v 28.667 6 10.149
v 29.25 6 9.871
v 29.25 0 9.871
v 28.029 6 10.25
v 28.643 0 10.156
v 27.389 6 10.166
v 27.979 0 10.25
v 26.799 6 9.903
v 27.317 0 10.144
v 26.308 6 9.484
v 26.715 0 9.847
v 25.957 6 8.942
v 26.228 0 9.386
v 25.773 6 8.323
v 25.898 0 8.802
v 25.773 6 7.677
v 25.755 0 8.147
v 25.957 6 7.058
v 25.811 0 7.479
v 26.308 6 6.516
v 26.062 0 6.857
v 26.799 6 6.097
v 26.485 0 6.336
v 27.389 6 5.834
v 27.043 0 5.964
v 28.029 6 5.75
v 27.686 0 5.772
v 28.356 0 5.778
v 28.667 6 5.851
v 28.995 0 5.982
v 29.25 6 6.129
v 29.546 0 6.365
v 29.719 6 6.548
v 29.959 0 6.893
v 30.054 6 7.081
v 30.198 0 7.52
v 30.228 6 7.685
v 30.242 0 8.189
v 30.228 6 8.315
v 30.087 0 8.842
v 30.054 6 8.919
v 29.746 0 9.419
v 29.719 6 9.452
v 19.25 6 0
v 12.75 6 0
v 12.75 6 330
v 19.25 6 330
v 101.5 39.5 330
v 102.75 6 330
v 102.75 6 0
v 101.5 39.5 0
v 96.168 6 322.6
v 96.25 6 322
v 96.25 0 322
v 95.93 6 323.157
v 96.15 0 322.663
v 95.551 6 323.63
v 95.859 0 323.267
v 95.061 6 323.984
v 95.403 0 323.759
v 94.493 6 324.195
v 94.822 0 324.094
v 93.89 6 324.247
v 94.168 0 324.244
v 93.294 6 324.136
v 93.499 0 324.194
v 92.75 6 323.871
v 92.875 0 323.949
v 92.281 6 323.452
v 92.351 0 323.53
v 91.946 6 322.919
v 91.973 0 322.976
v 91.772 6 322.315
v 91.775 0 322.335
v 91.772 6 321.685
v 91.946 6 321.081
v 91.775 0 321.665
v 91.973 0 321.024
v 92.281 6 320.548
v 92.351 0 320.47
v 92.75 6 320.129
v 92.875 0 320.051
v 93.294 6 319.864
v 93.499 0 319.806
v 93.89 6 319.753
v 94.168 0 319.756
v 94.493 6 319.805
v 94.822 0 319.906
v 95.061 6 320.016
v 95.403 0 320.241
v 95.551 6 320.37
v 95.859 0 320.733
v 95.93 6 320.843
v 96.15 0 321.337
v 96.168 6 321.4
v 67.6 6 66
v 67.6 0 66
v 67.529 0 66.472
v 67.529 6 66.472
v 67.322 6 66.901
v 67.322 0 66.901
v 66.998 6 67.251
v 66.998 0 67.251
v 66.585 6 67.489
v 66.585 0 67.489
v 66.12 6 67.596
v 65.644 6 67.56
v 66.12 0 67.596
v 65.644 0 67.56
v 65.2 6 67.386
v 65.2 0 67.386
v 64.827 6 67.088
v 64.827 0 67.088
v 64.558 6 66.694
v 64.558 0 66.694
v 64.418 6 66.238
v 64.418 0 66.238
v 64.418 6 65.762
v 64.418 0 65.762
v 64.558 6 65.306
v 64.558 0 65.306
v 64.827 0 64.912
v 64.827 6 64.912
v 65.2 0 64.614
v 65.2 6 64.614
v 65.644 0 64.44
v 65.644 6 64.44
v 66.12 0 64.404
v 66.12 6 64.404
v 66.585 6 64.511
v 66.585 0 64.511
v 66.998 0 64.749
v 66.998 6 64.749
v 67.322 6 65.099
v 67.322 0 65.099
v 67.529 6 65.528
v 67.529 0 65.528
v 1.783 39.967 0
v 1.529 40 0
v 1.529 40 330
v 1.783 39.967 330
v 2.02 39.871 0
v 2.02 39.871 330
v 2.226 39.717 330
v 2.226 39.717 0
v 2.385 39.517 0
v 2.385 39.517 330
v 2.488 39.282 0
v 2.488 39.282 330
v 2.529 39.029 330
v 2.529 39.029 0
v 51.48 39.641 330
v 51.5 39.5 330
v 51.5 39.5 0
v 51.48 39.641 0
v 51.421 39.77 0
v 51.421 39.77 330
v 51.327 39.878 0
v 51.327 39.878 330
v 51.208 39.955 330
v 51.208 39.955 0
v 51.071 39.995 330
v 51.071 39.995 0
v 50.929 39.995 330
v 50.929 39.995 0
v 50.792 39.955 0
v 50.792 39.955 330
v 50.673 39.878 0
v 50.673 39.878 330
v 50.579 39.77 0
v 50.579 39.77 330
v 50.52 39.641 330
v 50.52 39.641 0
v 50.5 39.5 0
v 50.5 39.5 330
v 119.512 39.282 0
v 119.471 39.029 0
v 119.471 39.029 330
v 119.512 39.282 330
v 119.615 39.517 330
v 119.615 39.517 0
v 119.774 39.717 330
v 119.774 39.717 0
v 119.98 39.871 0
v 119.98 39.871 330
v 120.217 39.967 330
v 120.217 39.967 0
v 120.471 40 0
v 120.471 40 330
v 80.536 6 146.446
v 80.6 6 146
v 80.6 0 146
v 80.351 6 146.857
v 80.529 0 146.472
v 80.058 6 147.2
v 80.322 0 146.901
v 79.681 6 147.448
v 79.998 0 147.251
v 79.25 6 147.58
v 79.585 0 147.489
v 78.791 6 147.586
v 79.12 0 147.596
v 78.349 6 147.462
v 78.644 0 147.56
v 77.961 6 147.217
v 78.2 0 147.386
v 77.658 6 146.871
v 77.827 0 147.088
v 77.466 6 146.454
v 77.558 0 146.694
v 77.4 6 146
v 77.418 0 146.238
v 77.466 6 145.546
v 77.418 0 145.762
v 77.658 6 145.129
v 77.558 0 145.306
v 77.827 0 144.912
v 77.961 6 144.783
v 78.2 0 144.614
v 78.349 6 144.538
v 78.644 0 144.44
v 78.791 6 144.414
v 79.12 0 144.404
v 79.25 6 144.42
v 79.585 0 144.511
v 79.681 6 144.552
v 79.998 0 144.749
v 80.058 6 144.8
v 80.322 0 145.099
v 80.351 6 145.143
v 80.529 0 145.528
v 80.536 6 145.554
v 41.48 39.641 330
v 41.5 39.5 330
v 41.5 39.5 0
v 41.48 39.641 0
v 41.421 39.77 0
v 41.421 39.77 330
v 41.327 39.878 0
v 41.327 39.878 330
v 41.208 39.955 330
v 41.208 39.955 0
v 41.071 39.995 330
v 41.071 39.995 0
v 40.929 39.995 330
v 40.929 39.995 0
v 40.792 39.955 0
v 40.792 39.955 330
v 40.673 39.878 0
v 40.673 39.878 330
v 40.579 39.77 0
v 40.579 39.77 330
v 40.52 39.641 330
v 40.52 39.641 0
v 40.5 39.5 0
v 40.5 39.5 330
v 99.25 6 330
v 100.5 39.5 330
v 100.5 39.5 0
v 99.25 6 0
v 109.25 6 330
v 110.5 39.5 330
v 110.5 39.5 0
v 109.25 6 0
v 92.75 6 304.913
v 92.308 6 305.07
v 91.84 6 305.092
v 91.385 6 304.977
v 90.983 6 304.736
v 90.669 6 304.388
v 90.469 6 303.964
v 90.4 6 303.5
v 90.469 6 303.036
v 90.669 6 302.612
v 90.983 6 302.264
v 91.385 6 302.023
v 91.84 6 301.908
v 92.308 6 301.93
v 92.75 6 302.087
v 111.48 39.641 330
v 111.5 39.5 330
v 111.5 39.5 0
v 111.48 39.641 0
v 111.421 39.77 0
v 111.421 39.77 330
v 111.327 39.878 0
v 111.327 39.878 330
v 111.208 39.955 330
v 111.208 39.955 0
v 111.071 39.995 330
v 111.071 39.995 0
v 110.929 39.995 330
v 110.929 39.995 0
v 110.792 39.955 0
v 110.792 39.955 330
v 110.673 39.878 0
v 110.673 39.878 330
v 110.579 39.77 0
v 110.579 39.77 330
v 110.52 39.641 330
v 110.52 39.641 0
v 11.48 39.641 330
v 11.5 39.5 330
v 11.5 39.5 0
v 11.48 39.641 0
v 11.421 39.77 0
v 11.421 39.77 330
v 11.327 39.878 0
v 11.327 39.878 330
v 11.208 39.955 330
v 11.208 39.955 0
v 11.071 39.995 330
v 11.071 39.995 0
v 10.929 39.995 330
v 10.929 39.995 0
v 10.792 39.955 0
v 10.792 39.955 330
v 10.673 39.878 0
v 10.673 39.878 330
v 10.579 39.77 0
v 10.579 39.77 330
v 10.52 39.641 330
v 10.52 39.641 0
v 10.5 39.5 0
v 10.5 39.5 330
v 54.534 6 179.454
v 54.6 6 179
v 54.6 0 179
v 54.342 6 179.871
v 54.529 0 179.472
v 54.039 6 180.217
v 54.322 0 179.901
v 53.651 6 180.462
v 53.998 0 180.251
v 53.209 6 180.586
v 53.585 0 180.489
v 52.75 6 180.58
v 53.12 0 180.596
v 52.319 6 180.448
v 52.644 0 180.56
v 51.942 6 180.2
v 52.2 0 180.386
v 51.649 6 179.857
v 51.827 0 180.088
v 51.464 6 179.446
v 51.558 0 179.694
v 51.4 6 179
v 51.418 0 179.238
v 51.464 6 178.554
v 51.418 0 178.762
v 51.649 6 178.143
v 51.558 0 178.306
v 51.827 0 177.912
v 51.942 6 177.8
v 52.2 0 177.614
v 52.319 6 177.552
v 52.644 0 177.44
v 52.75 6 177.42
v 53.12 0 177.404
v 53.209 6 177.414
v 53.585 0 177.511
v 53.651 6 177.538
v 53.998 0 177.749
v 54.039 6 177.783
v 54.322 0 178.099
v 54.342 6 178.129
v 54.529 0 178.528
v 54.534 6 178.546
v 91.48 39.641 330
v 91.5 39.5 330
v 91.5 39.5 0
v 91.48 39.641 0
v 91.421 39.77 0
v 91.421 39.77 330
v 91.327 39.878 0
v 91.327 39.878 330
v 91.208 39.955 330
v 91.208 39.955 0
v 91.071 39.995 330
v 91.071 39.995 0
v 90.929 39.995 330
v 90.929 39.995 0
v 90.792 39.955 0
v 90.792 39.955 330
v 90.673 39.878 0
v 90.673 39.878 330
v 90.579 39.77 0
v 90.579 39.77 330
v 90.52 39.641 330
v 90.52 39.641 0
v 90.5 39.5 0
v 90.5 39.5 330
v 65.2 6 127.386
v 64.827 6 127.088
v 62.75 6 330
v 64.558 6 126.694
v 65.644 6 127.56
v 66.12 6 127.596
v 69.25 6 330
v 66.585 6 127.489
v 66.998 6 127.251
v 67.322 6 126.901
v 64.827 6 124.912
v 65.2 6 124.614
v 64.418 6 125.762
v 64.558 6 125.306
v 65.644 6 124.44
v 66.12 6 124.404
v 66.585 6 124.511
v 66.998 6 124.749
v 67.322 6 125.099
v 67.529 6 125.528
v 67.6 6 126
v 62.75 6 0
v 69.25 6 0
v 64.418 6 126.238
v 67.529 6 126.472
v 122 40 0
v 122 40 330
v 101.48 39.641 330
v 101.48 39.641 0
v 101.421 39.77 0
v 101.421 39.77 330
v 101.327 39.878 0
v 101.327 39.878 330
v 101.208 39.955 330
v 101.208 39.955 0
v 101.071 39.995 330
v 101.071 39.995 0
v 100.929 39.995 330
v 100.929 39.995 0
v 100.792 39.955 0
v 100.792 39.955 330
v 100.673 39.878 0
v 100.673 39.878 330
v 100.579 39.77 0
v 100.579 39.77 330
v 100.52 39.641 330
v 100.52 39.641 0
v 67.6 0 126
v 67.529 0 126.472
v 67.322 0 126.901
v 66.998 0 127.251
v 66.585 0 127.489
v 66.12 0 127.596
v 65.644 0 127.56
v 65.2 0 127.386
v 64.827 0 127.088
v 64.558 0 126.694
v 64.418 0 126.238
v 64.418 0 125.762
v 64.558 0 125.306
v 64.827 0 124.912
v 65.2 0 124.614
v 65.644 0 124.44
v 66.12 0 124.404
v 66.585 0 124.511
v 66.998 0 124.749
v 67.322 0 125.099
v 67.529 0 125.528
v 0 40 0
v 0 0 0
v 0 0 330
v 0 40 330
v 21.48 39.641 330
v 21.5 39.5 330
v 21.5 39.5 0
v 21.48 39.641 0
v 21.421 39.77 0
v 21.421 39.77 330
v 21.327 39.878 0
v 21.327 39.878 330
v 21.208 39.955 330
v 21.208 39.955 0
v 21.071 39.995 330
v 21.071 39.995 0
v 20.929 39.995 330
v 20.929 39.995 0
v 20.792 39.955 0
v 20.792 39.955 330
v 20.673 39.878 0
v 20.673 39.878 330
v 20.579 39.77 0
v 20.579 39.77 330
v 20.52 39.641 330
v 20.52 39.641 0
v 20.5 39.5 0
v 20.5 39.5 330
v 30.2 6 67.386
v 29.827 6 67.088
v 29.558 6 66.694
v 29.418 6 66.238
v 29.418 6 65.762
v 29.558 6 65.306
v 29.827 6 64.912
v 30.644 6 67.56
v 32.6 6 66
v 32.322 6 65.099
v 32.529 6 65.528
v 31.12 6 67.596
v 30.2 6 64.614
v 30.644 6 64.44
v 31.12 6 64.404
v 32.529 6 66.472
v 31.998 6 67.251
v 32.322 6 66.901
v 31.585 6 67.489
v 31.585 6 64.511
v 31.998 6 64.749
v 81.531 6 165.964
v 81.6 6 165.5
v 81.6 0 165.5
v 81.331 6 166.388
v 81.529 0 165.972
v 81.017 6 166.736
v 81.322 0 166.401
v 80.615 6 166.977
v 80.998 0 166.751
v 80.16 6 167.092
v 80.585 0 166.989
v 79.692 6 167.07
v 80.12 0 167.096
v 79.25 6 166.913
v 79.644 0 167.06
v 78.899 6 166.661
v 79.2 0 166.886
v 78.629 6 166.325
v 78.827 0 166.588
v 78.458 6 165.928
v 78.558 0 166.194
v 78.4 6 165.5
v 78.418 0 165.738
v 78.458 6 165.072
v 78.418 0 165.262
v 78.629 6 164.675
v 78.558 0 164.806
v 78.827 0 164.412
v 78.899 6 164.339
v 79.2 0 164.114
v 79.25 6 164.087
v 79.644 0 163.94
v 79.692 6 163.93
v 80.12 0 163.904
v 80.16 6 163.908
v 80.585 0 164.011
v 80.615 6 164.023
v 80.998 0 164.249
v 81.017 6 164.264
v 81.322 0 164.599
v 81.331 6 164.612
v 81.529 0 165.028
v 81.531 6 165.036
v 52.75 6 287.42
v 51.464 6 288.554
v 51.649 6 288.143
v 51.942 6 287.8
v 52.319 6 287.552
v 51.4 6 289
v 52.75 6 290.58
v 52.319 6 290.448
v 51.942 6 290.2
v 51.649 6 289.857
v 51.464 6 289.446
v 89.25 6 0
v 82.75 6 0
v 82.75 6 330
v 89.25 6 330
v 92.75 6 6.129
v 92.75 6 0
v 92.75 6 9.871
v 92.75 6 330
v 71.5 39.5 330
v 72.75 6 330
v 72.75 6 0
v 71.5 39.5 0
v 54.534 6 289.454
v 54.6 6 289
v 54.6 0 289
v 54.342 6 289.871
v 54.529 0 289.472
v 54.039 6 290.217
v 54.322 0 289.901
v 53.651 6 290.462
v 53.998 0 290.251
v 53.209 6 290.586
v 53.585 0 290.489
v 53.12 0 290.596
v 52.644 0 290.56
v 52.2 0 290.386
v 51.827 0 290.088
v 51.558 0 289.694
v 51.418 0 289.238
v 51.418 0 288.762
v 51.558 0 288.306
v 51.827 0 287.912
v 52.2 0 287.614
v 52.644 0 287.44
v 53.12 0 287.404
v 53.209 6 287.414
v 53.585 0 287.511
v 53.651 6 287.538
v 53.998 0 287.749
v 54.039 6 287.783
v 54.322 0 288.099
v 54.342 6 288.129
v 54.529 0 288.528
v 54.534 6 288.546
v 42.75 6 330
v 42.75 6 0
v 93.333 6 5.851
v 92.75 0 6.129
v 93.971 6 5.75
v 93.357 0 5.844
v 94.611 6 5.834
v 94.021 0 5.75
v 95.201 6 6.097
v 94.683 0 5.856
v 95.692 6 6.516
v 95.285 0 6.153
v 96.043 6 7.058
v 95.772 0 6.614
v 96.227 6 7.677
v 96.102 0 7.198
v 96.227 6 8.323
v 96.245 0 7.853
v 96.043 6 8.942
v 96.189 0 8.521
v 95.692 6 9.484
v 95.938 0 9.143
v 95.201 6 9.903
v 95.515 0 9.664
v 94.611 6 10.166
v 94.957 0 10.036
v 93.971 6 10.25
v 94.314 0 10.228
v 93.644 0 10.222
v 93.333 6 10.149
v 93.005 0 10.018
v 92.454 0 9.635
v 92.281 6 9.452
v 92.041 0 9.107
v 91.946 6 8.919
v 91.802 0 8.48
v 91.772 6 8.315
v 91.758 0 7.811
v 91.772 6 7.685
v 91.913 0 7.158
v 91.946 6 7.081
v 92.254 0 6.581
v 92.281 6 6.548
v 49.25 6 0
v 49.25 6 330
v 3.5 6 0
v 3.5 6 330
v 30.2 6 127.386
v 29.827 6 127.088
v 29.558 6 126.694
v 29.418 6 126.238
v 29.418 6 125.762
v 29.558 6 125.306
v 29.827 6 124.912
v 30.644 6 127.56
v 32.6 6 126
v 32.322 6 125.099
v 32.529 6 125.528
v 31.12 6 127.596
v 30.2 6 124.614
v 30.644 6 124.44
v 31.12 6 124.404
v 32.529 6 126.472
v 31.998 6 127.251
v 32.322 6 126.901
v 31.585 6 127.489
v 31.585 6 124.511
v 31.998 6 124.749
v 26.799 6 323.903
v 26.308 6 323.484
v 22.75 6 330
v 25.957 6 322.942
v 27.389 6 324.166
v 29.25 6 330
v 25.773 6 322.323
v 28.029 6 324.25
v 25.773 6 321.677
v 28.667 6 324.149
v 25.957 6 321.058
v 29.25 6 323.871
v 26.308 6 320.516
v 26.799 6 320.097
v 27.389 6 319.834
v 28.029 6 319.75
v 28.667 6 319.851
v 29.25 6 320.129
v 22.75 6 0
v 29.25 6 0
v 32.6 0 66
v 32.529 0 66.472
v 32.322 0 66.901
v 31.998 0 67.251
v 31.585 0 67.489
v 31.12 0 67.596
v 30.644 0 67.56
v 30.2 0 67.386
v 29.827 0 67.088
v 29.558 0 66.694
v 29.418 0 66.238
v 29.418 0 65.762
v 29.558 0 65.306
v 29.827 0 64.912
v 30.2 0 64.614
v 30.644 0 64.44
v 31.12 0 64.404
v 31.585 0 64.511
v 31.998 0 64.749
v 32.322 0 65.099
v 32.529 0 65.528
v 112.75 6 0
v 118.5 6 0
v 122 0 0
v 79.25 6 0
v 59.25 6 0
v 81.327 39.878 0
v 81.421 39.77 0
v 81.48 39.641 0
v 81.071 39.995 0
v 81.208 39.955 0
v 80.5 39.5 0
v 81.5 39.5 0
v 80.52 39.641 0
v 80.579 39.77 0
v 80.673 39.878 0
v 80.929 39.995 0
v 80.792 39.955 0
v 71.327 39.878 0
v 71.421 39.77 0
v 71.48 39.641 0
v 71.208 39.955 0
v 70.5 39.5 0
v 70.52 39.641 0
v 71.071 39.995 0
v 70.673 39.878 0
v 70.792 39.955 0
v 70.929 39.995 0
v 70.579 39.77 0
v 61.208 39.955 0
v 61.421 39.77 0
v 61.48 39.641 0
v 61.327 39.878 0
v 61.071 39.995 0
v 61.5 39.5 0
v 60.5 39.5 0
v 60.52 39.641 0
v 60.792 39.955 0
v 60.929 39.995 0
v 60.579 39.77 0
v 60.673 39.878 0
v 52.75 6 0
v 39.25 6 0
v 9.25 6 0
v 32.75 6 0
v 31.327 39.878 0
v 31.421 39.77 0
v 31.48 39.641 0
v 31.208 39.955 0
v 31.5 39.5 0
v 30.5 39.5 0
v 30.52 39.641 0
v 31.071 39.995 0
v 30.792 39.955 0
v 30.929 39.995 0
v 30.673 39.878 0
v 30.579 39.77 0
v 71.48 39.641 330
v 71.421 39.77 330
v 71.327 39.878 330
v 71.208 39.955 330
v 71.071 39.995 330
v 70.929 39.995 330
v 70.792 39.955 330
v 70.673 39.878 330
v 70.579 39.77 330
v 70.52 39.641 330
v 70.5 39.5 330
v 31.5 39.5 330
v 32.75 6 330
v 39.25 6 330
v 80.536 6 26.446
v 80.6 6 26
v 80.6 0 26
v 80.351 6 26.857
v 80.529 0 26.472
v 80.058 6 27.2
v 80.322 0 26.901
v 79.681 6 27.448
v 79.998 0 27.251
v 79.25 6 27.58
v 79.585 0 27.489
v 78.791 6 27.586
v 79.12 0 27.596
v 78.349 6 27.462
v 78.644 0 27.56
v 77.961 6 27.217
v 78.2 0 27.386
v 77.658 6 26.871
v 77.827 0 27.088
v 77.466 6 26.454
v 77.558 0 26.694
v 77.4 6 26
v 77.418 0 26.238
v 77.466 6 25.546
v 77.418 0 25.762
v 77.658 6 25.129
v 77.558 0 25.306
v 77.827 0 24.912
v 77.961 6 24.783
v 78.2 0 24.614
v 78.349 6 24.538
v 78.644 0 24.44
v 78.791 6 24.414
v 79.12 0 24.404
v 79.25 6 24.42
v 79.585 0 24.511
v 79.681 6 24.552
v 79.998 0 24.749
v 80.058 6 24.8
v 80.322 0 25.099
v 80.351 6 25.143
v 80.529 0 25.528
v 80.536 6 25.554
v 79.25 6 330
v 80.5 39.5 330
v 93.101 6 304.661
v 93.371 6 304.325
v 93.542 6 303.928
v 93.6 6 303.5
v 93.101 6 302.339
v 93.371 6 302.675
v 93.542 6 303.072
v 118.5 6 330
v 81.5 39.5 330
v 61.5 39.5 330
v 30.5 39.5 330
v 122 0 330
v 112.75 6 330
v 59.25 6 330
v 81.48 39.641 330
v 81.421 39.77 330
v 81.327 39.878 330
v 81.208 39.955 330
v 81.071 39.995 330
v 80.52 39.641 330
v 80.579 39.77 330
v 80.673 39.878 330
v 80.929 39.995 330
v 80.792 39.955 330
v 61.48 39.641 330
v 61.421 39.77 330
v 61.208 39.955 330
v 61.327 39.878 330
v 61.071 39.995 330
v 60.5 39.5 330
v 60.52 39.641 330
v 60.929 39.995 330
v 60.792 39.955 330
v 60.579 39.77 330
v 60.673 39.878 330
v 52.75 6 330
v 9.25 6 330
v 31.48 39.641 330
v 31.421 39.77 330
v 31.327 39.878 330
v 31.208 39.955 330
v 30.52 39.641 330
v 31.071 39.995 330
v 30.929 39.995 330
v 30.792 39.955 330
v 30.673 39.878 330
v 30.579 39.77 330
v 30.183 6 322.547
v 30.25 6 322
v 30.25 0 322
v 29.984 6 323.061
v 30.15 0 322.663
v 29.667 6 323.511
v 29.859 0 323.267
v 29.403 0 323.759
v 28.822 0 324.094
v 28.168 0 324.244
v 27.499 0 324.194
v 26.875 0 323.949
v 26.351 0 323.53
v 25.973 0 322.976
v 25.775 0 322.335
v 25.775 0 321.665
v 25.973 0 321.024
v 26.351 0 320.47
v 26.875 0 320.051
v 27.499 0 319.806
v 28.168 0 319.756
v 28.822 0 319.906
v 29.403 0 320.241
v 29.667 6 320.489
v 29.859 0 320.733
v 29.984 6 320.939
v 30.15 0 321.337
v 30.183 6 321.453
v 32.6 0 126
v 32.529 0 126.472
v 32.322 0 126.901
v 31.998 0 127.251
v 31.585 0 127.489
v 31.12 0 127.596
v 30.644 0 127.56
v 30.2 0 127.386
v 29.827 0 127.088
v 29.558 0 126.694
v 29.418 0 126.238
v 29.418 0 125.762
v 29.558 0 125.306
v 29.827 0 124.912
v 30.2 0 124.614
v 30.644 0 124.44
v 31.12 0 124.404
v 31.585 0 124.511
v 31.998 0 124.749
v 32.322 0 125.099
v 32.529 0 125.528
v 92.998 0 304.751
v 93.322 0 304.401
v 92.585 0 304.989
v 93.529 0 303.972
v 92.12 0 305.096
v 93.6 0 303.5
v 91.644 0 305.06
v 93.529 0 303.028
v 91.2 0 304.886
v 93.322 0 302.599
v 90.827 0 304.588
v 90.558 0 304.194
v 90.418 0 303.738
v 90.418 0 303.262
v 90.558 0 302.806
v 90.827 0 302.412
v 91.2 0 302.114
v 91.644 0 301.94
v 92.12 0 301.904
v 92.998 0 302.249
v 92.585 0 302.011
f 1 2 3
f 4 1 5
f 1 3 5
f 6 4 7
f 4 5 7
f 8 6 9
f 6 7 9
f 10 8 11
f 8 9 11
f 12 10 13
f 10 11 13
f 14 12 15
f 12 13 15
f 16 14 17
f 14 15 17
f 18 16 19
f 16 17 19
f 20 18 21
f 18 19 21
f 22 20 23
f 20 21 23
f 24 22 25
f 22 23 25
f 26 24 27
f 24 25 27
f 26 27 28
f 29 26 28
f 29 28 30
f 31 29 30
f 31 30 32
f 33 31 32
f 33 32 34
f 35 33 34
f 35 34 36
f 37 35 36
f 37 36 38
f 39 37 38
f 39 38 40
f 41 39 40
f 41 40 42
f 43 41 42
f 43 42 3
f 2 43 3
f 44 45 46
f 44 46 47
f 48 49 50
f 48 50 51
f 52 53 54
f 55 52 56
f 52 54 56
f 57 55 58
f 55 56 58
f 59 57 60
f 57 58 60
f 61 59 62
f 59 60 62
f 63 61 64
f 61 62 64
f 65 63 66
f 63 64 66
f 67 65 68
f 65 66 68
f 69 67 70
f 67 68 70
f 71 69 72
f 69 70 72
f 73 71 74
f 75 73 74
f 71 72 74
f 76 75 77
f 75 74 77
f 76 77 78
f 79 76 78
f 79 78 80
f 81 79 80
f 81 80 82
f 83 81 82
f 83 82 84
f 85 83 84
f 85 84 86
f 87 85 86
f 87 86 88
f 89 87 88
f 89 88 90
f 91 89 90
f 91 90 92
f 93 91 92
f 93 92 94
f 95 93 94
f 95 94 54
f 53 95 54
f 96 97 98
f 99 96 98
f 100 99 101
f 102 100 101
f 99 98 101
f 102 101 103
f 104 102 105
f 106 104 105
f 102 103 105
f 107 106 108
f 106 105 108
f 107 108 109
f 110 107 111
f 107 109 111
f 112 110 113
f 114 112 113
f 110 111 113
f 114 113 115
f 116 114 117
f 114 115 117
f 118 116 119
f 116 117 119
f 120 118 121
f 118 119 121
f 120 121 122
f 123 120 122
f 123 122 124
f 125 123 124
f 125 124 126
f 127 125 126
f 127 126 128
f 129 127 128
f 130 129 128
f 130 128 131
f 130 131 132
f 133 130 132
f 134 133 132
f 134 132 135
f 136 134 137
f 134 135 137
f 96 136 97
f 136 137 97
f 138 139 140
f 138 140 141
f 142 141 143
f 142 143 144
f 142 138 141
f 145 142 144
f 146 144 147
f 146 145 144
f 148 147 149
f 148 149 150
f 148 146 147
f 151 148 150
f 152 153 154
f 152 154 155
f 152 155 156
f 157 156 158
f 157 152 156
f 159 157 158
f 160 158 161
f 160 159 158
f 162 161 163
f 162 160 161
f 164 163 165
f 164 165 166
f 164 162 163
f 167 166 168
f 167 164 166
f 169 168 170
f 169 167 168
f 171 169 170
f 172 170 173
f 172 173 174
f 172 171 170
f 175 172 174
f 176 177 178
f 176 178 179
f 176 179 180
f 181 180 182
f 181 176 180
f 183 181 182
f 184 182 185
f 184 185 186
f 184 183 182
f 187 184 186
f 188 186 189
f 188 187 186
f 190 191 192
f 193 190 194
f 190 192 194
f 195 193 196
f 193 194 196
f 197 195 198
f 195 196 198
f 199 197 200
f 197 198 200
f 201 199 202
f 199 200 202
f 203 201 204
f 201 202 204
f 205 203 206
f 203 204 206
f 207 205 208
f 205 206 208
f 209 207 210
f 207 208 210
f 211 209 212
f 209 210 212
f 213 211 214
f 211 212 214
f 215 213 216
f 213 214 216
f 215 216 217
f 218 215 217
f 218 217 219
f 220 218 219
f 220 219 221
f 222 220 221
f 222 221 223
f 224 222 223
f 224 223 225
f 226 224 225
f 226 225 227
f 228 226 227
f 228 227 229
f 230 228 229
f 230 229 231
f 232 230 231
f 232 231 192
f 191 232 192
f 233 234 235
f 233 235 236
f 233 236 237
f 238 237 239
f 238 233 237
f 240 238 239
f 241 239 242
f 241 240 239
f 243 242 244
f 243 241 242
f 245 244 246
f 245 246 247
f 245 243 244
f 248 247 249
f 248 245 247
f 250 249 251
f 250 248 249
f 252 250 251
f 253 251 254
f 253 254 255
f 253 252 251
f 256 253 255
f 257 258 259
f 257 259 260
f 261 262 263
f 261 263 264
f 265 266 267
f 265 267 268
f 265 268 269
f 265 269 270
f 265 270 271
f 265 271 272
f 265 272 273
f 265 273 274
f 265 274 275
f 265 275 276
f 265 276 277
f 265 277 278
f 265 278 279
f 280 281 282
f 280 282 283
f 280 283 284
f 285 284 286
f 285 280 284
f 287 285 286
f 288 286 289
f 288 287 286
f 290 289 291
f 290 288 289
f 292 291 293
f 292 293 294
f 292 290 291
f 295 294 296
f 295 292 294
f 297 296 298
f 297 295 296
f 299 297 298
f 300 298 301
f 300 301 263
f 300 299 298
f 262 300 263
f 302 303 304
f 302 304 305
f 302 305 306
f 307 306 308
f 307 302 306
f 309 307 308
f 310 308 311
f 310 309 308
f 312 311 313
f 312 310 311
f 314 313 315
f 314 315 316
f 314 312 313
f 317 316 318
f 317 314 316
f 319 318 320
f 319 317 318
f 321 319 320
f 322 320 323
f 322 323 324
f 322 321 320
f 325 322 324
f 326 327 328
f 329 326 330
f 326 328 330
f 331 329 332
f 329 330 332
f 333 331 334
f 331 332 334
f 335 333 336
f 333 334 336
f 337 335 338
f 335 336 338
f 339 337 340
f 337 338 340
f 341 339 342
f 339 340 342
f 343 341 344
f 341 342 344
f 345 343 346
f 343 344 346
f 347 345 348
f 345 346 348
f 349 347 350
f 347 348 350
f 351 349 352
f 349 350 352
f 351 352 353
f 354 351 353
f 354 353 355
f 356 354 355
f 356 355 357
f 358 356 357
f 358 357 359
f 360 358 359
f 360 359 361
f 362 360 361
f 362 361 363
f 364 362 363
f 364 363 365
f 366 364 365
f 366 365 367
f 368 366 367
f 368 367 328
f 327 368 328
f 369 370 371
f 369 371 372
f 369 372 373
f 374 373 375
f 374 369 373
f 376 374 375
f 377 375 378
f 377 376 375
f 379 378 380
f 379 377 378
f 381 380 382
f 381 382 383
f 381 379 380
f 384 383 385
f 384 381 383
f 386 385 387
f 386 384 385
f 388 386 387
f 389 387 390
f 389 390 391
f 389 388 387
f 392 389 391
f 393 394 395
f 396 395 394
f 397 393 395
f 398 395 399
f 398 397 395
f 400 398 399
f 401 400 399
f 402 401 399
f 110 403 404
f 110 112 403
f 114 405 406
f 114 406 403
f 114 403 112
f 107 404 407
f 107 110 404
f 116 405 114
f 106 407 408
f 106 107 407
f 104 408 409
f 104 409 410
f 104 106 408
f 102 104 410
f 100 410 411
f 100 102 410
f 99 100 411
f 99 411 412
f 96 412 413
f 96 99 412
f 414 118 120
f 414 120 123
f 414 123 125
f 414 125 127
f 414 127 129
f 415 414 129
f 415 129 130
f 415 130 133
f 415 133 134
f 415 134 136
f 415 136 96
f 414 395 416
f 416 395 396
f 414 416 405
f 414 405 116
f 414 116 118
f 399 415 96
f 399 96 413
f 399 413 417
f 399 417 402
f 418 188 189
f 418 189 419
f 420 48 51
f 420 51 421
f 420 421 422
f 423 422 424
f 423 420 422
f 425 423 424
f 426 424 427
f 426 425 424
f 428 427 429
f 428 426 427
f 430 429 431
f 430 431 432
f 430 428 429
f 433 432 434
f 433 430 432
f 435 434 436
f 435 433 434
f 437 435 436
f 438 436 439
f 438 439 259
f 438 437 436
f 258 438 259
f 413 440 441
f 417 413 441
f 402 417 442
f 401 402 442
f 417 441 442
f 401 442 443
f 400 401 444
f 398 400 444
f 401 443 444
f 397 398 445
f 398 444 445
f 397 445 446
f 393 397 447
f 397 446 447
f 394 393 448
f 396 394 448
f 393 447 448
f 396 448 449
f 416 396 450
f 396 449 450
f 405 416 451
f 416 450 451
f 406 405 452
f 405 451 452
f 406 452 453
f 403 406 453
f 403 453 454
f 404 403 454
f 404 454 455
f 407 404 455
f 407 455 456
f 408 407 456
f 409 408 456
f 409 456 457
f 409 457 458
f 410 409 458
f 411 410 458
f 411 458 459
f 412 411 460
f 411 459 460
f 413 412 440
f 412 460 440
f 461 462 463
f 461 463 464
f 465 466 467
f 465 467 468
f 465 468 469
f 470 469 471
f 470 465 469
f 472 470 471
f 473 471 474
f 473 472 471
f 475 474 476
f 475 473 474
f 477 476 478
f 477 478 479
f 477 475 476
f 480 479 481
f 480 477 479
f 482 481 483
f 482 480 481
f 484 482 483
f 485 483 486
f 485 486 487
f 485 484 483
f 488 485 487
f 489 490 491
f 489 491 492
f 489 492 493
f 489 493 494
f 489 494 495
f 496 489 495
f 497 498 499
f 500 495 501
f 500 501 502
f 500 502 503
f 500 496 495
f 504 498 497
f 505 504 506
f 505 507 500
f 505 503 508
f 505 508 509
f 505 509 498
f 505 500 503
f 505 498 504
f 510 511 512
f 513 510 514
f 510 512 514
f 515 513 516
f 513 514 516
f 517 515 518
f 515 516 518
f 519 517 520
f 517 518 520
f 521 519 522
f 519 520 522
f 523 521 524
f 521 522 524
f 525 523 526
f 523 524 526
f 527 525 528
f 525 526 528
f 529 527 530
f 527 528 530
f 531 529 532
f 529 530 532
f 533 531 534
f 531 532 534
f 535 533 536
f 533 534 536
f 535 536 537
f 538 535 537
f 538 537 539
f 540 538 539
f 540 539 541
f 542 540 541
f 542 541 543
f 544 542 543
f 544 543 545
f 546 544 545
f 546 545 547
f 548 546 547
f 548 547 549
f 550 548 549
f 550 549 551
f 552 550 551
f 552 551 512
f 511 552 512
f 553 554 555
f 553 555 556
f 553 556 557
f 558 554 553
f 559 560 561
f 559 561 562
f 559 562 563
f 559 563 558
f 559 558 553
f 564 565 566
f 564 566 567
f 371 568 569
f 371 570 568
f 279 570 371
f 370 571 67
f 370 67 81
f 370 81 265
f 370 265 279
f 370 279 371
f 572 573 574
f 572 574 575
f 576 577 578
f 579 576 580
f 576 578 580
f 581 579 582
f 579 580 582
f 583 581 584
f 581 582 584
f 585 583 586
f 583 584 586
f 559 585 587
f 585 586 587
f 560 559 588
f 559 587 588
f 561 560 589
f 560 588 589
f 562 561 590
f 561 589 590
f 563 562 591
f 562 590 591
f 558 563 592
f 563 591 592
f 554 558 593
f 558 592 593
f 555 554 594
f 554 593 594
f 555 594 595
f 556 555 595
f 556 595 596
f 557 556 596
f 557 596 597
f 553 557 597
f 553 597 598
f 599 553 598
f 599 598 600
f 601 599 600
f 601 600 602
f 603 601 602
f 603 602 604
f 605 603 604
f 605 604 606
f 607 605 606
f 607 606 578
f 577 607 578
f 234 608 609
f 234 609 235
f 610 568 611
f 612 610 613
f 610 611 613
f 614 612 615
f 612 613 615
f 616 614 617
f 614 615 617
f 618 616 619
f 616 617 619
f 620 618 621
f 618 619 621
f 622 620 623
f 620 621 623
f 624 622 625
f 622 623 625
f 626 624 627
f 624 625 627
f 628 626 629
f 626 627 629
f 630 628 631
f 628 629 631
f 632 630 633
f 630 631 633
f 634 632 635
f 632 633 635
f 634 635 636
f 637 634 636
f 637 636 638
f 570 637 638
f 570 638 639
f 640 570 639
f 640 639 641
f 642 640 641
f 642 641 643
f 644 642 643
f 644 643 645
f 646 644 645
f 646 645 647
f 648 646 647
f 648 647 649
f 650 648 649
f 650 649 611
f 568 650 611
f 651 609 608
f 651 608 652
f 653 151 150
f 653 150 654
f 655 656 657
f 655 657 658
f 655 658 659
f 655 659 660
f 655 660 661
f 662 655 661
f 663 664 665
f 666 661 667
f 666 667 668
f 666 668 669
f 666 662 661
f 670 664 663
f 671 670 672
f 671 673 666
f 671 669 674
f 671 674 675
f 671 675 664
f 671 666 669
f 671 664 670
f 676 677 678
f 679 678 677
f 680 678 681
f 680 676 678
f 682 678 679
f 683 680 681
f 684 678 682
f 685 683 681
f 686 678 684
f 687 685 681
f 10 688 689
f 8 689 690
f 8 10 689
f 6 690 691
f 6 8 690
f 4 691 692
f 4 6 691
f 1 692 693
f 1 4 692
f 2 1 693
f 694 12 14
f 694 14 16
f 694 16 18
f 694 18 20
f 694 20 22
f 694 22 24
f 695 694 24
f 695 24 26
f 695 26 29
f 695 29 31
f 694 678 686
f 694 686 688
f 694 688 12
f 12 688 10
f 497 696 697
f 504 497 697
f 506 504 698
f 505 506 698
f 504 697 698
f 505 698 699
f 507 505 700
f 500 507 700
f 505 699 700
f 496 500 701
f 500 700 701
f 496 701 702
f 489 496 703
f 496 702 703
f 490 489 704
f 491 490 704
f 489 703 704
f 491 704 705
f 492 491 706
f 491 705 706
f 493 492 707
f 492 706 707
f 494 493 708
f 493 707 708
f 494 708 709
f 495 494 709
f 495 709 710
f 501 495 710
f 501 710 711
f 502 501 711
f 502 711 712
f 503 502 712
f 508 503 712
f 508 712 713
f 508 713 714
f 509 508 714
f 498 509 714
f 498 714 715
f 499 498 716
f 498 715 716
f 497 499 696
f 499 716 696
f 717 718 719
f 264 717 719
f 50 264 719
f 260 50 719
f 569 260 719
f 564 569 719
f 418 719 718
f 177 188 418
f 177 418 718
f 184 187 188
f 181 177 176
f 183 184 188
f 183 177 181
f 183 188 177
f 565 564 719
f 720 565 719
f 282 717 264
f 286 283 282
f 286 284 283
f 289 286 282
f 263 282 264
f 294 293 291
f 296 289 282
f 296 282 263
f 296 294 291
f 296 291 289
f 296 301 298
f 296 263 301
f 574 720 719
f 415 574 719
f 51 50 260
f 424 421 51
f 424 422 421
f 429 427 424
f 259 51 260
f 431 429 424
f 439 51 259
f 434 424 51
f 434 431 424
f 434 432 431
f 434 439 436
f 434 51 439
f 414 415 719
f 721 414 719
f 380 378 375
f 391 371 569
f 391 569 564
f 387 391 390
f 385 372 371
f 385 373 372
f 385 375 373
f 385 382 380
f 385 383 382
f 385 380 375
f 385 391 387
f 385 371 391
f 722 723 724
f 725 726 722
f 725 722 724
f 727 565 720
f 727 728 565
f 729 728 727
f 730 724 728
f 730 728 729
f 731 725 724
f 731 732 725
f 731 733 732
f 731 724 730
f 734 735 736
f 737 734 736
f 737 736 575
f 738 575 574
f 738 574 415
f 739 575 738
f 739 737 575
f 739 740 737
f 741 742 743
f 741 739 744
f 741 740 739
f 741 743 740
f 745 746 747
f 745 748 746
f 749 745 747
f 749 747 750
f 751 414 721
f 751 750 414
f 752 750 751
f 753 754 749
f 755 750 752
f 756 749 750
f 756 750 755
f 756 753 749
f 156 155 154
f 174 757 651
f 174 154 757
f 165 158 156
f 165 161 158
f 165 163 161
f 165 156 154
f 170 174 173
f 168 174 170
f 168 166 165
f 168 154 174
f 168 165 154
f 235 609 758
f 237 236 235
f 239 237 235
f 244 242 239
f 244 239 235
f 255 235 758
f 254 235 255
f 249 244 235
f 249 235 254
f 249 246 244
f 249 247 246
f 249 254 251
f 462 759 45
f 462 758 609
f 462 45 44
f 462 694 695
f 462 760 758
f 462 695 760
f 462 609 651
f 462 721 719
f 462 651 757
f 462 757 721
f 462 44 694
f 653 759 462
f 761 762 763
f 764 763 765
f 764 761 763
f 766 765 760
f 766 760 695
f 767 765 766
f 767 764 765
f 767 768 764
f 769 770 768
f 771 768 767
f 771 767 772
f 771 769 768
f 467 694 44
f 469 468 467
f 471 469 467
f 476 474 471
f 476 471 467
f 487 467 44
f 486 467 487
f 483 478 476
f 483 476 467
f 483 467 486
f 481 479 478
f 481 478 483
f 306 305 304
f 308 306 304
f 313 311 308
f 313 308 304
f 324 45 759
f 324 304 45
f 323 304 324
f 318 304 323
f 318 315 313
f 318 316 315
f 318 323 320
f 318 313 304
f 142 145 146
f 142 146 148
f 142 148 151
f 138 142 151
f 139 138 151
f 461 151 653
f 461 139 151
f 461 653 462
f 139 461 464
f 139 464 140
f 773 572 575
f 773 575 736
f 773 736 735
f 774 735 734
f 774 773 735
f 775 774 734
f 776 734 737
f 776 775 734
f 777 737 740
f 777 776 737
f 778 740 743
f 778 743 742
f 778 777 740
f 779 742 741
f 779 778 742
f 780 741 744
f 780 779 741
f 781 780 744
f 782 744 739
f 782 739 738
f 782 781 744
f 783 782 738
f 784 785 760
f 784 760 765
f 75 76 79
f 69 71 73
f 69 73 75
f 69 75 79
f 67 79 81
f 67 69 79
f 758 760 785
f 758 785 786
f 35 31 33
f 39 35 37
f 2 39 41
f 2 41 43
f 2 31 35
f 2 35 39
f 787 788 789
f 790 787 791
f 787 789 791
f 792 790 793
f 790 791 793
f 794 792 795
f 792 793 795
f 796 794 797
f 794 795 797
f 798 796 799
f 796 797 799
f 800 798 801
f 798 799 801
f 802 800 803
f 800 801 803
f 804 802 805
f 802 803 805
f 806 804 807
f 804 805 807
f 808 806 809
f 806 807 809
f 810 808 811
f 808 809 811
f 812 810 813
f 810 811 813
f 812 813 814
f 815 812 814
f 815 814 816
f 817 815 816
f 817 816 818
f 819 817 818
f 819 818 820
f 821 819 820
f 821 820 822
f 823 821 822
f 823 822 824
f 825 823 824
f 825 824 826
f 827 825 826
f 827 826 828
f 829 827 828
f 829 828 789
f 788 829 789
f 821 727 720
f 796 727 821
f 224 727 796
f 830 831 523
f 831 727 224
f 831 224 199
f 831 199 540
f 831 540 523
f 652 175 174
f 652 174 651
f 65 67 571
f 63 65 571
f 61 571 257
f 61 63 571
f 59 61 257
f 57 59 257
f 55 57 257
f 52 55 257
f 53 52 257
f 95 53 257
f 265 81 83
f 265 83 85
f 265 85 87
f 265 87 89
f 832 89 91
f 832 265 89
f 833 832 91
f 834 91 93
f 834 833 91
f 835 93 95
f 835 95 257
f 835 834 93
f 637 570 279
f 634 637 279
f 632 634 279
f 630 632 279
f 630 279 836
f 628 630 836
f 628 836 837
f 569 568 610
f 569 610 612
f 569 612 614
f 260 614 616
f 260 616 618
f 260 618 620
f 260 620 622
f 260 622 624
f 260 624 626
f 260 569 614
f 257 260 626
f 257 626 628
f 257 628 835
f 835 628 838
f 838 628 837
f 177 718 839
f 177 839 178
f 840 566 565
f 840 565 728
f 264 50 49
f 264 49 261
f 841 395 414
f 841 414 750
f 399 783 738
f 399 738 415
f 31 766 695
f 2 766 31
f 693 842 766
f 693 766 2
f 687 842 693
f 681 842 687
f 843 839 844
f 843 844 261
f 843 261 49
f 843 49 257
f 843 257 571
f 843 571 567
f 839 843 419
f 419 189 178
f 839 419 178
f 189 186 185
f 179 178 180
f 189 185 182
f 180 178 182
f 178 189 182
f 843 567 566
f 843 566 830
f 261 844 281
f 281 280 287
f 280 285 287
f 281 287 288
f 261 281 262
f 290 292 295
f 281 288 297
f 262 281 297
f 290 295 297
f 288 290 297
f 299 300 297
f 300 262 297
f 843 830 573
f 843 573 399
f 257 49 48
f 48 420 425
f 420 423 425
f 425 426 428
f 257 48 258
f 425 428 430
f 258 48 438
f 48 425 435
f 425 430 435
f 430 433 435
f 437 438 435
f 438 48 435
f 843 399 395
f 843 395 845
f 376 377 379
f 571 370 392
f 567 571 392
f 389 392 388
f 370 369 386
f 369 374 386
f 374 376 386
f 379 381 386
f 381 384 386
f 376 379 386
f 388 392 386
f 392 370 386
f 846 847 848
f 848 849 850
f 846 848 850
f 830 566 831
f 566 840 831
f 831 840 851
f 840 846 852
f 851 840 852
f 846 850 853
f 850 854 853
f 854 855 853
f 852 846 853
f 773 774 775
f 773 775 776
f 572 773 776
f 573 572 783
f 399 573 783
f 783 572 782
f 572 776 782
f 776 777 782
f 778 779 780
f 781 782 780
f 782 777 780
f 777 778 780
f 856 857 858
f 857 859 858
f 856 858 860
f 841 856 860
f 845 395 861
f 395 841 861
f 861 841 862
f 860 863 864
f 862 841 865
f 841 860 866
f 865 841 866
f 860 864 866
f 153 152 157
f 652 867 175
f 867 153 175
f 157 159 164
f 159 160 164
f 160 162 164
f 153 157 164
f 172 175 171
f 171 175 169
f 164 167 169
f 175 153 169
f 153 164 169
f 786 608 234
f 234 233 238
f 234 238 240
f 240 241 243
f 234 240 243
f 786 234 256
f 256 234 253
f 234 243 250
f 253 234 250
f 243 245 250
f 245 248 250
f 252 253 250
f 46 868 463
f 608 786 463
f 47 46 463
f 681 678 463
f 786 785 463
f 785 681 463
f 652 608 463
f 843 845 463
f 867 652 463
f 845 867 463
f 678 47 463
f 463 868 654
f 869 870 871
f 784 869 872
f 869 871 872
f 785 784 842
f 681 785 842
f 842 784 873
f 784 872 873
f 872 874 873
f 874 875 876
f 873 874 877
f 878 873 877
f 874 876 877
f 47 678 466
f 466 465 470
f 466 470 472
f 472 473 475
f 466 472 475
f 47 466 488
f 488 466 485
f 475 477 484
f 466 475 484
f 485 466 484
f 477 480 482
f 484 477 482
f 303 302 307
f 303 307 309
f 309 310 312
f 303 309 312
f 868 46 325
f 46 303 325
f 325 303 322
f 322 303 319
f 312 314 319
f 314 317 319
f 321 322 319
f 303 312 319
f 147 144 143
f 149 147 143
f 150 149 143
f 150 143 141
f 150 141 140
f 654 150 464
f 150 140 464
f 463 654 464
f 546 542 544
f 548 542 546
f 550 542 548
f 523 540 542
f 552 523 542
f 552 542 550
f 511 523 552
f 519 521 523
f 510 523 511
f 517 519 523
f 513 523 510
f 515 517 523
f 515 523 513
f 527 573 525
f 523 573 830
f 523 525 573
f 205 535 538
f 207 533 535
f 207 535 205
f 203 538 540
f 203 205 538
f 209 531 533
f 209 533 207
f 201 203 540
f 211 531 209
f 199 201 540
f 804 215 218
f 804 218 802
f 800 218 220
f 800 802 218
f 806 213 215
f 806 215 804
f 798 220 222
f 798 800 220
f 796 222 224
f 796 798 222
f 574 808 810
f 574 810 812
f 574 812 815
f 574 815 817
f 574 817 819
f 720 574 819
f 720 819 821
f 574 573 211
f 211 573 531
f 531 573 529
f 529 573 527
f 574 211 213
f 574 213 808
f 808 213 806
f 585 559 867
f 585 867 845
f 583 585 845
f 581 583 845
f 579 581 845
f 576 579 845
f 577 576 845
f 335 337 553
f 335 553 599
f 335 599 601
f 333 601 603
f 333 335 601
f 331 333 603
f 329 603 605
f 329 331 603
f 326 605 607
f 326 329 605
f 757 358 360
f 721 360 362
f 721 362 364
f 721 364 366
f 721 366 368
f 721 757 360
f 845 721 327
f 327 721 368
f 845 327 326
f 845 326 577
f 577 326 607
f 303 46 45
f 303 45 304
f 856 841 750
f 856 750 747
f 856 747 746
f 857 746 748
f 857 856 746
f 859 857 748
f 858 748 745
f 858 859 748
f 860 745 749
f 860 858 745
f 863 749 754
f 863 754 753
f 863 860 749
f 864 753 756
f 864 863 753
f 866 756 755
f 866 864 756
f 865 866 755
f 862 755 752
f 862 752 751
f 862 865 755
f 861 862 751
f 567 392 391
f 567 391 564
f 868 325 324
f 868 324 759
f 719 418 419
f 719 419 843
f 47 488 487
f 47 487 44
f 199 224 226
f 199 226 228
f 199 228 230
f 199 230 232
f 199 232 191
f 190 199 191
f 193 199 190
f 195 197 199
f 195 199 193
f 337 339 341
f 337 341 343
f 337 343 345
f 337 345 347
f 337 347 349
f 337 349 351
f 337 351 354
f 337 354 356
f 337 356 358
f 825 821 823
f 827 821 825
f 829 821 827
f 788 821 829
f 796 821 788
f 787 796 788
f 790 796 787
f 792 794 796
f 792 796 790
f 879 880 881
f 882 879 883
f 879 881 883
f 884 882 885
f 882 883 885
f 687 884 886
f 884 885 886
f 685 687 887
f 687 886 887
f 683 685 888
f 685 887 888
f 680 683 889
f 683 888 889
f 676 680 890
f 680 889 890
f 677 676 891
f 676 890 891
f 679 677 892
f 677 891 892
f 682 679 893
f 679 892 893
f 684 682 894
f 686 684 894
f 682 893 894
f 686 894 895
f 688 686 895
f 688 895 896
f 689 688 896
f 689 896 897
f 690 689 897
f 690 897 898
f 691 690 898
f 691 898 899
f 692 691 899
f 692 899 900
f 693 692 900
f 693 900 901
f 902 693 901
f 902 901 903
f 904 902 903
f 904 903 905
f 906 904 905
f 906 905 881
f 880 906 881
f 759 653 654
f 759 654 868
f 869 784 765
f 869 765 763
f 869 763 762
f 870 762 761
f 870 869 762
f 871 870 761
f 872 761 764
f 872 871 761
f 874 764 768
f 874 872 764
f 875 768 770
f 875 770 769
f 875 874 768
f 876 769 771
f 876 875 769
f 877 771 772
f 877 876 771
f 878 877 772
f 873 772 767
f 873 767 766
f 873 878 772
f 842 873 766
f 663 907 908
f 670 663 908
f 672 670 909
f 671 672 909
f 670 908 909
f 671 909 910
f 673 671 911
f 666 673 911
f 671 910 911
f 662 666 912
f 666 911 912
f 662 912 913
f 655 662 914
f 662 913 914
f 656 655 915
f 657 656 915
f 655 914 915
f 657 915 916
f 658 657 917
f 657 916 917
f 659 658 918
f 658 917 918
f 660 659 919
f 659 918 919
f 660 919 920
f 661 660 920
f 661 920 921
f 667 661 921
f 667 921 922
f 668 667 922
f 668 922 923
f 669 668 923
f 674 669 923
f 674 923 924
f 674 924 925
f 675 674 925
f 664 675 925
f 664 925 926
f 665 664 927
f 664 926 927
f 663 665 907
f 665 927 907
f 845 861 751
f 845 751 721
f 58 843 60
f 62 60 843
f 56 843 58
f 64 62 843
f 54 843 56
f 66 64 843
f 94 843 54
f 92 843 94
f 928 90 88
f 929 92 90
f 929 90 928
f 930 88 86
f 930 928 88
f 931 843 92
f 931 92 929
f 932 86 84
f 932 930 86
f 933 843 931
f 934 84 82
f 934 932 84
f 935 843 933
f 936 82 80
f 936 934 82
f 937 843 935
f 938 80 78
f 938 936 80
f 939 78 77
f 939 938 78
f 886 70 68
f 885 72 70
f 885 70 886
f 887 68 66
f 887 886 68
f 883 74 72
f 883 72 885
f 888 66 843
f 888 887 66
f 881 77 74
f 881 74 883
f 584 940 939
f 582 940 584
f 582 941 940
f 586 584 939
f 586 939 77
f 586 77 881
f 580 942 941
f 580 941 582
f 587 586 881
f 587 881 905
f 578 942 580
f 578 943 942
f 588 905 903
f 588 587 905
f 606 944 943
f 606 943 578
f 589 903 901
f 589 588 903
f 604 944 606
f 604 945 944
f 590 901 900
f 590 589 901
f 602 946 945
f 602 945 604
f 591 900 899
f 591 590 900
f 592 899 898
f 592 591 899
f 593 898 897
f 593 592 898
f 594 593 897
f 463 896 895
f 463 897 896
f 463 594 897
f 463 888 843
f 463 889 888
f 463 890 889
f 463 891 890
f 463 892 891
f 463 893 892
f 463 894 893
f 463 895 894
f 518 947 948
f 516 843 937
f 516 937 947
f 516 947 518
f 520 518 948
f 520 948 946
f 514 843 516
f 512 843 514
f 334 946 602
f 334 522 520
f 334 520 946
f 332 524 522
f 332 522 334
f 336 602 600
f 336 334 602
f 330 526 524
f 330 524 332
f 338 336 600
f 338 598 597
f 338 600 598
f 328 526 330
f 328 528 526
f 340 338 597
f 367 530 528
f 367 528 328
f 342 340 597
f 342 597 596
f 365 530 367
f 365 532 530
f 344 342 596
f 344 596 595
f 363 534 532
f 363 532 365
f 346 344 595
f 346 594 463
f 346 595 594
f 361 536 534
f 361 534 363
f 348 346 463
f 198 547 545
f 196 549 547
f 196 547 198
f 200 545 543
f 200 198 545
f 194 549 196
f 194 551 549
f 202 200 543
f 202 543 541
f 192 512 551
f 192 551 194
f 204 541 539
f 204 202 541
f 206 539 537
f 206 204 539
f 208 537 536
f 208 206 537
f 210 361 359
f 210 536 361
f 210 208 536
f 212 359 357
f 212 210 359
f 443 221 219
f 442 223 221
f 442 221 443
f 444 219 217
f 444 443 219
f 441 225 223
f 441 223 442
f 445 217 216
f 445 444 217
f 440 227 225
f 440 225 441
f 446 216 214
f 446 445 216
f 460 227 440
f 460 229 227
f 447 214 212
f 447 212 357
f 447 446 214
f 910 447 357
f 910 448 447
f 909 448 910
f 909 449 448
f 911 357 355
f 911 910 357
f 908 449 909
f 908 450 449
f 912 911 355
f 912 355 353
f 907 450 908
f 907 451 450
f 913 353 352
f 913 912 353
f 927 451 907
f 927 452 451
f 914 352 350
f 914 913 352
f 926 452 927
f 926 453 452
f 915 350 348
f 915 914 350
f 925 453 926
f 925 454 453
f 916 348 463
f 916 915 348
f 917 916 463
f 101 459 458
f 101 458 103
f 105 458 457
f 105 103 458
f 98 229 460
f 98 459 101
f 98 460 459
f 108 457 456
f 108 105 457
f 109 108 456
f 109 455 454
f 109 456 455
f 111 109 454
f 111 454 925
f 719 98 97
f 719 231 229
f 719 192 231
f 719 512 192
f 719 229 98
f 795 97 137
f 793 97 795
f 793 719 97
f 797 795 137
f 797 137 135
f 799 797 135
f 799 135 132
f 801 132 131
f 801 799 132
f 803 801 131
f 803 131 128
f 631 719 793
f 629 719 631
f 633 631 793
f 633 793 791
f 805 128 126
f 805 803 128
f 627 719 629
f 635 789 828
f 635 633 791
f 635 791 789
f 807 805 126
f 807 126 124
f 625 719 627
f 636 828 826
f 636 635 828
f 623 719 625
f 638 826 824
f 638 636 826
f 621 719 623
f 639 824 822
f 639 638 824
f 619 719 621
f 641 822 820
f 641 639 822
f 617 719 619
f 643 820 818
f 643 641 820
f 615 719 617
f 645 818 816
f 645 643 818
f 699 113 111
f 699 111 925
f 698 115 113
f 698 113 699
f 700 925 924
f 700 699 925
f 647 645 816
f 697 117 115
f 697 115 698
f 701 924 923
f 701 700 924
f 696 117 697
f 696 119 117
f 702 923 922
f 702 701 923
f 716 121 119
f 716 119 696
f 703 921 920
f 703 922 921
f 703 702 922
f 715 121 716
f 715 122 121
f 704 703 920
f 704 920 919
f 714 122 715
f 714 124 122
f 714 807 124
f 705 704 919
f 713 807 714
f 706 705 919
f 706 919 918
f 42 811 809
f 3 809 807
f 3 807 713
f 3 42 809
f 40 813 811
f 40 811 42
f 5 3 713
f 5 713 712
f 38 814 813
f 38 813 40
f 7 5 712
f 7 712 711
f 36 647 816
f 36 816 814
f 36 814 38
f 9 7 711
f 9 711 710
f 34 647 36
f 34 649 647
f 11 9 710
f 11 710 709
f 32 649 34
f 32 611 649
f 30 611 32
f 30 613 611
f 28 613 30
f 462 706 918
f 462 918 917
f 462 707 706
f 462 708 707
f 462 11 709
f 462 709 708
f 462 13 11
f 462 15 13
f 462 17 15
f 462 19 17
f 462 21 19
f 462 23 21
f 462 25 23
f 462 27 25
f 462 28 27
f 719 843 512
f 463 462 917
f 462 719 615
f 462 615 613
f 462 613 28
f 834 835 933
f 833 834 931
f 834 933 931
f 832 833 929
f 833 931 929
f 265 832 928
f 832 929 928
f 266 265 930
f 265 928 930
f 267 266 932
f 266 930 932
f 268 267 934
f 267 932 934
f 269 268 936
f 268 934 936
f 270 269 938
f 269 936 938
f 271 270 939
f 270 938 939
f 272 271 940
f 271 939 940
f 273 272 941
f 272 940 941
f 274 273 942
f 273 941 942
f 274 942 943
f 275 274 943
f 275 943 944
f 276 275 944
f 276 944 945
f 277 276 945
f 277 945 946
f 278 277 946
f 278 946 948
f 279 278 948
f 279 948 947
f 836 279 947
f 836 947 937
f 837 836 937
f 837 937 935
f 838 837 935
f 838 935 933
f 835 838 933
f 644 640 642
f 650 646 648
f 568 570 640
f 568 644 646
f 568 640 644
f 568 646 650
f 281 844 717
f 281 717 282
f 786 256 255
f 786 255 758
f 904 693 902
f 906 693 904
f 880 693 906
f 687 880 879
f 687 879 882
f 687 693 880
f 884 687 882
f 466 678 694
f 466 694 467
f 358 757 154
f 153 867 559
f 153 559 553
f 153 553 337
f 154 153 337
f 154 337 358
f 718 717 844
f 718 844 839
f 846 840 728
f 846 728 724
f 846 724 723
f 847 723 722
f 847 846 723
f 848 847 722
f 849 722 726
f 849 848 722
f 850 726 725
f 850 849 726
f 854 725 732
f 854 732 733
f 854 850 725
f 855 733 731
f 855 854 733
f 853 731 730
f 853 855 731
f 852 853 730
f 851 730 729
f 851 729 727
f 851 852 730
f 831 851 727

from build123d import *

# Parameters (mm, degrees)
EXTRUDE_1_DEPTH       = 330
EXTRUDE_3_DEPTH       = 330
PATTERN_CURVE_1_COUNT = 11
PATTERN_CURVE_1_PITCH = 10
SKETCH_3_R            = 2.25
CUT_EXTRUDE_1_DEPTH   = 6
SKETCH_4_R            = 1.6
CUT_EXTRUDE_2_DEPTH   = 6


with BuildPart() as part:
    # Эскиз1 → Вытянуть1 (new body)
    with BuildSketch(Plane.XY):
        with BuildLine():
            Line((0, 40), (1.528979332, 40))
            ThreePointArc((1.528979332, 40), (2.225614441, 39.717425624), (2.528547087, 39.029399052))
            Line((2.528547087, 39.029399052), (3.5, 6))
            Line((3.5, 6), (118.5, 6))
            Line((118.5, 6), (119.471452913, 39.029399052))
            ThreePointArc((119.471452913, 39.029399052), (119.774385559, 39.717425624), (120.471020668, 40))
            Line((120.471020668, 40), (122, 40))
            Line((122, 40), (122, 0))
            Line((122, 0), (0, 0))
            Line((0, 0), (0, 40))
        make_face()
    extrude(amount=EXTRUDE_1_DEPTH)

    # Эскиз2 → Вытянуть3 (add)
    with BuildSketch(Plane.XY.offset(330)):
        with BuildLine():
            Line((10.5, 39.5), (9.25, 6))
            Line((9.25, 6), (12.75, 6))
            Line((12.75, 6), (11.5, 39.5))
            ThreePointArc((11.5, 39.5), (11, 40), (10.5, 39.5))
        make_face()
    extrude_3 = extrude(amount=-EXTRUDE_3_DEPTH)

    # Кривая1: Вытянуть3 ×11
    with Locations(*[(i * PATTERN_CURVE_1_PITCH, 0, 0) for i in range(1, PATTERN_CURVE_1_COUNT)]):
        add(extrude_3)

    # Эскиз3 → Вырез-Вытянуть1 (cut)
    with BuildSketch(Plane.XZ):
        with Locations((28, 322)):
            Circle(SKETCH_3_R)
        with Locations((94, 322)):
            Circle(SKETCH_3_R)
        with Locations(Location((94, 8, 0), (0, 0, 236.251011404))):
            Circle(SKETCH_3_R)
        with Locations(Location((28, 8, 0), (0, 0, 56.251011404))):
            Circle(SKETCH_3_R)
    extrude(amount=-CUT_EXTRUDE_1_DEPTH, mode=Mode.SUBTRACT)

    # Эскиз4 → Вырез-Вытянуть2 (cut)
    with BuildSketch(Plane(origin=(147.933613103, 0, 237.946321054), x_dir=(-1, 0, 0), z_dir=(0, -1, 0))):
        with Locations(Location((94.933613103, -51.053678946, 0), (0, 0, 180))):
            Circle(SKETCH_4_R)
        with Locations(Location((116.933613103, 111.946321054, 0), (0, 0, 180))):
            Circle(SKETCH_4_R)
        with Locations(Location((68.933613103, 211.946321054, 0), (0, 0, 180))):
            Circle(SKETCH_4_R)
        with Locations(Location((68.933613103, 91.946321054, 0), (0, 0, 180))):
            Circle(SKETCH_4_R)
        with Locations(Location((81.933613103, 111.946321054, 0), (0, 0, 180))):
            Circle(SKETCH_4_R)
        with Locations(Location((116.933613103, 171.946321054, 0), (0, 0, 180))):
            Circle(SKETCH_4_R)
        with Locations(Location((81.933613103, 171.946321054, 0), (0, 0, 180))):
            Circle(SKETCH_4_R)
        with Locations(Location((94.933613103, 58.946321054, 0), (0, 0, 180))):
            Circle(SKETCH_4_R)
        with Locations(Location((55.933613103, -65.553678946, 0), (0, 0, 180))):
            Circle(SKETCH_4_R)
        with Locations(Location((67.933613103, 72.446321054, 0), (0, 0, 180))):
            Circle(SKETCH_4_R)
    extrude(amount=-CUT_EXTRUDE_2_DEPTH, mode=Mode.SUBTRACT)


solid = part.part
